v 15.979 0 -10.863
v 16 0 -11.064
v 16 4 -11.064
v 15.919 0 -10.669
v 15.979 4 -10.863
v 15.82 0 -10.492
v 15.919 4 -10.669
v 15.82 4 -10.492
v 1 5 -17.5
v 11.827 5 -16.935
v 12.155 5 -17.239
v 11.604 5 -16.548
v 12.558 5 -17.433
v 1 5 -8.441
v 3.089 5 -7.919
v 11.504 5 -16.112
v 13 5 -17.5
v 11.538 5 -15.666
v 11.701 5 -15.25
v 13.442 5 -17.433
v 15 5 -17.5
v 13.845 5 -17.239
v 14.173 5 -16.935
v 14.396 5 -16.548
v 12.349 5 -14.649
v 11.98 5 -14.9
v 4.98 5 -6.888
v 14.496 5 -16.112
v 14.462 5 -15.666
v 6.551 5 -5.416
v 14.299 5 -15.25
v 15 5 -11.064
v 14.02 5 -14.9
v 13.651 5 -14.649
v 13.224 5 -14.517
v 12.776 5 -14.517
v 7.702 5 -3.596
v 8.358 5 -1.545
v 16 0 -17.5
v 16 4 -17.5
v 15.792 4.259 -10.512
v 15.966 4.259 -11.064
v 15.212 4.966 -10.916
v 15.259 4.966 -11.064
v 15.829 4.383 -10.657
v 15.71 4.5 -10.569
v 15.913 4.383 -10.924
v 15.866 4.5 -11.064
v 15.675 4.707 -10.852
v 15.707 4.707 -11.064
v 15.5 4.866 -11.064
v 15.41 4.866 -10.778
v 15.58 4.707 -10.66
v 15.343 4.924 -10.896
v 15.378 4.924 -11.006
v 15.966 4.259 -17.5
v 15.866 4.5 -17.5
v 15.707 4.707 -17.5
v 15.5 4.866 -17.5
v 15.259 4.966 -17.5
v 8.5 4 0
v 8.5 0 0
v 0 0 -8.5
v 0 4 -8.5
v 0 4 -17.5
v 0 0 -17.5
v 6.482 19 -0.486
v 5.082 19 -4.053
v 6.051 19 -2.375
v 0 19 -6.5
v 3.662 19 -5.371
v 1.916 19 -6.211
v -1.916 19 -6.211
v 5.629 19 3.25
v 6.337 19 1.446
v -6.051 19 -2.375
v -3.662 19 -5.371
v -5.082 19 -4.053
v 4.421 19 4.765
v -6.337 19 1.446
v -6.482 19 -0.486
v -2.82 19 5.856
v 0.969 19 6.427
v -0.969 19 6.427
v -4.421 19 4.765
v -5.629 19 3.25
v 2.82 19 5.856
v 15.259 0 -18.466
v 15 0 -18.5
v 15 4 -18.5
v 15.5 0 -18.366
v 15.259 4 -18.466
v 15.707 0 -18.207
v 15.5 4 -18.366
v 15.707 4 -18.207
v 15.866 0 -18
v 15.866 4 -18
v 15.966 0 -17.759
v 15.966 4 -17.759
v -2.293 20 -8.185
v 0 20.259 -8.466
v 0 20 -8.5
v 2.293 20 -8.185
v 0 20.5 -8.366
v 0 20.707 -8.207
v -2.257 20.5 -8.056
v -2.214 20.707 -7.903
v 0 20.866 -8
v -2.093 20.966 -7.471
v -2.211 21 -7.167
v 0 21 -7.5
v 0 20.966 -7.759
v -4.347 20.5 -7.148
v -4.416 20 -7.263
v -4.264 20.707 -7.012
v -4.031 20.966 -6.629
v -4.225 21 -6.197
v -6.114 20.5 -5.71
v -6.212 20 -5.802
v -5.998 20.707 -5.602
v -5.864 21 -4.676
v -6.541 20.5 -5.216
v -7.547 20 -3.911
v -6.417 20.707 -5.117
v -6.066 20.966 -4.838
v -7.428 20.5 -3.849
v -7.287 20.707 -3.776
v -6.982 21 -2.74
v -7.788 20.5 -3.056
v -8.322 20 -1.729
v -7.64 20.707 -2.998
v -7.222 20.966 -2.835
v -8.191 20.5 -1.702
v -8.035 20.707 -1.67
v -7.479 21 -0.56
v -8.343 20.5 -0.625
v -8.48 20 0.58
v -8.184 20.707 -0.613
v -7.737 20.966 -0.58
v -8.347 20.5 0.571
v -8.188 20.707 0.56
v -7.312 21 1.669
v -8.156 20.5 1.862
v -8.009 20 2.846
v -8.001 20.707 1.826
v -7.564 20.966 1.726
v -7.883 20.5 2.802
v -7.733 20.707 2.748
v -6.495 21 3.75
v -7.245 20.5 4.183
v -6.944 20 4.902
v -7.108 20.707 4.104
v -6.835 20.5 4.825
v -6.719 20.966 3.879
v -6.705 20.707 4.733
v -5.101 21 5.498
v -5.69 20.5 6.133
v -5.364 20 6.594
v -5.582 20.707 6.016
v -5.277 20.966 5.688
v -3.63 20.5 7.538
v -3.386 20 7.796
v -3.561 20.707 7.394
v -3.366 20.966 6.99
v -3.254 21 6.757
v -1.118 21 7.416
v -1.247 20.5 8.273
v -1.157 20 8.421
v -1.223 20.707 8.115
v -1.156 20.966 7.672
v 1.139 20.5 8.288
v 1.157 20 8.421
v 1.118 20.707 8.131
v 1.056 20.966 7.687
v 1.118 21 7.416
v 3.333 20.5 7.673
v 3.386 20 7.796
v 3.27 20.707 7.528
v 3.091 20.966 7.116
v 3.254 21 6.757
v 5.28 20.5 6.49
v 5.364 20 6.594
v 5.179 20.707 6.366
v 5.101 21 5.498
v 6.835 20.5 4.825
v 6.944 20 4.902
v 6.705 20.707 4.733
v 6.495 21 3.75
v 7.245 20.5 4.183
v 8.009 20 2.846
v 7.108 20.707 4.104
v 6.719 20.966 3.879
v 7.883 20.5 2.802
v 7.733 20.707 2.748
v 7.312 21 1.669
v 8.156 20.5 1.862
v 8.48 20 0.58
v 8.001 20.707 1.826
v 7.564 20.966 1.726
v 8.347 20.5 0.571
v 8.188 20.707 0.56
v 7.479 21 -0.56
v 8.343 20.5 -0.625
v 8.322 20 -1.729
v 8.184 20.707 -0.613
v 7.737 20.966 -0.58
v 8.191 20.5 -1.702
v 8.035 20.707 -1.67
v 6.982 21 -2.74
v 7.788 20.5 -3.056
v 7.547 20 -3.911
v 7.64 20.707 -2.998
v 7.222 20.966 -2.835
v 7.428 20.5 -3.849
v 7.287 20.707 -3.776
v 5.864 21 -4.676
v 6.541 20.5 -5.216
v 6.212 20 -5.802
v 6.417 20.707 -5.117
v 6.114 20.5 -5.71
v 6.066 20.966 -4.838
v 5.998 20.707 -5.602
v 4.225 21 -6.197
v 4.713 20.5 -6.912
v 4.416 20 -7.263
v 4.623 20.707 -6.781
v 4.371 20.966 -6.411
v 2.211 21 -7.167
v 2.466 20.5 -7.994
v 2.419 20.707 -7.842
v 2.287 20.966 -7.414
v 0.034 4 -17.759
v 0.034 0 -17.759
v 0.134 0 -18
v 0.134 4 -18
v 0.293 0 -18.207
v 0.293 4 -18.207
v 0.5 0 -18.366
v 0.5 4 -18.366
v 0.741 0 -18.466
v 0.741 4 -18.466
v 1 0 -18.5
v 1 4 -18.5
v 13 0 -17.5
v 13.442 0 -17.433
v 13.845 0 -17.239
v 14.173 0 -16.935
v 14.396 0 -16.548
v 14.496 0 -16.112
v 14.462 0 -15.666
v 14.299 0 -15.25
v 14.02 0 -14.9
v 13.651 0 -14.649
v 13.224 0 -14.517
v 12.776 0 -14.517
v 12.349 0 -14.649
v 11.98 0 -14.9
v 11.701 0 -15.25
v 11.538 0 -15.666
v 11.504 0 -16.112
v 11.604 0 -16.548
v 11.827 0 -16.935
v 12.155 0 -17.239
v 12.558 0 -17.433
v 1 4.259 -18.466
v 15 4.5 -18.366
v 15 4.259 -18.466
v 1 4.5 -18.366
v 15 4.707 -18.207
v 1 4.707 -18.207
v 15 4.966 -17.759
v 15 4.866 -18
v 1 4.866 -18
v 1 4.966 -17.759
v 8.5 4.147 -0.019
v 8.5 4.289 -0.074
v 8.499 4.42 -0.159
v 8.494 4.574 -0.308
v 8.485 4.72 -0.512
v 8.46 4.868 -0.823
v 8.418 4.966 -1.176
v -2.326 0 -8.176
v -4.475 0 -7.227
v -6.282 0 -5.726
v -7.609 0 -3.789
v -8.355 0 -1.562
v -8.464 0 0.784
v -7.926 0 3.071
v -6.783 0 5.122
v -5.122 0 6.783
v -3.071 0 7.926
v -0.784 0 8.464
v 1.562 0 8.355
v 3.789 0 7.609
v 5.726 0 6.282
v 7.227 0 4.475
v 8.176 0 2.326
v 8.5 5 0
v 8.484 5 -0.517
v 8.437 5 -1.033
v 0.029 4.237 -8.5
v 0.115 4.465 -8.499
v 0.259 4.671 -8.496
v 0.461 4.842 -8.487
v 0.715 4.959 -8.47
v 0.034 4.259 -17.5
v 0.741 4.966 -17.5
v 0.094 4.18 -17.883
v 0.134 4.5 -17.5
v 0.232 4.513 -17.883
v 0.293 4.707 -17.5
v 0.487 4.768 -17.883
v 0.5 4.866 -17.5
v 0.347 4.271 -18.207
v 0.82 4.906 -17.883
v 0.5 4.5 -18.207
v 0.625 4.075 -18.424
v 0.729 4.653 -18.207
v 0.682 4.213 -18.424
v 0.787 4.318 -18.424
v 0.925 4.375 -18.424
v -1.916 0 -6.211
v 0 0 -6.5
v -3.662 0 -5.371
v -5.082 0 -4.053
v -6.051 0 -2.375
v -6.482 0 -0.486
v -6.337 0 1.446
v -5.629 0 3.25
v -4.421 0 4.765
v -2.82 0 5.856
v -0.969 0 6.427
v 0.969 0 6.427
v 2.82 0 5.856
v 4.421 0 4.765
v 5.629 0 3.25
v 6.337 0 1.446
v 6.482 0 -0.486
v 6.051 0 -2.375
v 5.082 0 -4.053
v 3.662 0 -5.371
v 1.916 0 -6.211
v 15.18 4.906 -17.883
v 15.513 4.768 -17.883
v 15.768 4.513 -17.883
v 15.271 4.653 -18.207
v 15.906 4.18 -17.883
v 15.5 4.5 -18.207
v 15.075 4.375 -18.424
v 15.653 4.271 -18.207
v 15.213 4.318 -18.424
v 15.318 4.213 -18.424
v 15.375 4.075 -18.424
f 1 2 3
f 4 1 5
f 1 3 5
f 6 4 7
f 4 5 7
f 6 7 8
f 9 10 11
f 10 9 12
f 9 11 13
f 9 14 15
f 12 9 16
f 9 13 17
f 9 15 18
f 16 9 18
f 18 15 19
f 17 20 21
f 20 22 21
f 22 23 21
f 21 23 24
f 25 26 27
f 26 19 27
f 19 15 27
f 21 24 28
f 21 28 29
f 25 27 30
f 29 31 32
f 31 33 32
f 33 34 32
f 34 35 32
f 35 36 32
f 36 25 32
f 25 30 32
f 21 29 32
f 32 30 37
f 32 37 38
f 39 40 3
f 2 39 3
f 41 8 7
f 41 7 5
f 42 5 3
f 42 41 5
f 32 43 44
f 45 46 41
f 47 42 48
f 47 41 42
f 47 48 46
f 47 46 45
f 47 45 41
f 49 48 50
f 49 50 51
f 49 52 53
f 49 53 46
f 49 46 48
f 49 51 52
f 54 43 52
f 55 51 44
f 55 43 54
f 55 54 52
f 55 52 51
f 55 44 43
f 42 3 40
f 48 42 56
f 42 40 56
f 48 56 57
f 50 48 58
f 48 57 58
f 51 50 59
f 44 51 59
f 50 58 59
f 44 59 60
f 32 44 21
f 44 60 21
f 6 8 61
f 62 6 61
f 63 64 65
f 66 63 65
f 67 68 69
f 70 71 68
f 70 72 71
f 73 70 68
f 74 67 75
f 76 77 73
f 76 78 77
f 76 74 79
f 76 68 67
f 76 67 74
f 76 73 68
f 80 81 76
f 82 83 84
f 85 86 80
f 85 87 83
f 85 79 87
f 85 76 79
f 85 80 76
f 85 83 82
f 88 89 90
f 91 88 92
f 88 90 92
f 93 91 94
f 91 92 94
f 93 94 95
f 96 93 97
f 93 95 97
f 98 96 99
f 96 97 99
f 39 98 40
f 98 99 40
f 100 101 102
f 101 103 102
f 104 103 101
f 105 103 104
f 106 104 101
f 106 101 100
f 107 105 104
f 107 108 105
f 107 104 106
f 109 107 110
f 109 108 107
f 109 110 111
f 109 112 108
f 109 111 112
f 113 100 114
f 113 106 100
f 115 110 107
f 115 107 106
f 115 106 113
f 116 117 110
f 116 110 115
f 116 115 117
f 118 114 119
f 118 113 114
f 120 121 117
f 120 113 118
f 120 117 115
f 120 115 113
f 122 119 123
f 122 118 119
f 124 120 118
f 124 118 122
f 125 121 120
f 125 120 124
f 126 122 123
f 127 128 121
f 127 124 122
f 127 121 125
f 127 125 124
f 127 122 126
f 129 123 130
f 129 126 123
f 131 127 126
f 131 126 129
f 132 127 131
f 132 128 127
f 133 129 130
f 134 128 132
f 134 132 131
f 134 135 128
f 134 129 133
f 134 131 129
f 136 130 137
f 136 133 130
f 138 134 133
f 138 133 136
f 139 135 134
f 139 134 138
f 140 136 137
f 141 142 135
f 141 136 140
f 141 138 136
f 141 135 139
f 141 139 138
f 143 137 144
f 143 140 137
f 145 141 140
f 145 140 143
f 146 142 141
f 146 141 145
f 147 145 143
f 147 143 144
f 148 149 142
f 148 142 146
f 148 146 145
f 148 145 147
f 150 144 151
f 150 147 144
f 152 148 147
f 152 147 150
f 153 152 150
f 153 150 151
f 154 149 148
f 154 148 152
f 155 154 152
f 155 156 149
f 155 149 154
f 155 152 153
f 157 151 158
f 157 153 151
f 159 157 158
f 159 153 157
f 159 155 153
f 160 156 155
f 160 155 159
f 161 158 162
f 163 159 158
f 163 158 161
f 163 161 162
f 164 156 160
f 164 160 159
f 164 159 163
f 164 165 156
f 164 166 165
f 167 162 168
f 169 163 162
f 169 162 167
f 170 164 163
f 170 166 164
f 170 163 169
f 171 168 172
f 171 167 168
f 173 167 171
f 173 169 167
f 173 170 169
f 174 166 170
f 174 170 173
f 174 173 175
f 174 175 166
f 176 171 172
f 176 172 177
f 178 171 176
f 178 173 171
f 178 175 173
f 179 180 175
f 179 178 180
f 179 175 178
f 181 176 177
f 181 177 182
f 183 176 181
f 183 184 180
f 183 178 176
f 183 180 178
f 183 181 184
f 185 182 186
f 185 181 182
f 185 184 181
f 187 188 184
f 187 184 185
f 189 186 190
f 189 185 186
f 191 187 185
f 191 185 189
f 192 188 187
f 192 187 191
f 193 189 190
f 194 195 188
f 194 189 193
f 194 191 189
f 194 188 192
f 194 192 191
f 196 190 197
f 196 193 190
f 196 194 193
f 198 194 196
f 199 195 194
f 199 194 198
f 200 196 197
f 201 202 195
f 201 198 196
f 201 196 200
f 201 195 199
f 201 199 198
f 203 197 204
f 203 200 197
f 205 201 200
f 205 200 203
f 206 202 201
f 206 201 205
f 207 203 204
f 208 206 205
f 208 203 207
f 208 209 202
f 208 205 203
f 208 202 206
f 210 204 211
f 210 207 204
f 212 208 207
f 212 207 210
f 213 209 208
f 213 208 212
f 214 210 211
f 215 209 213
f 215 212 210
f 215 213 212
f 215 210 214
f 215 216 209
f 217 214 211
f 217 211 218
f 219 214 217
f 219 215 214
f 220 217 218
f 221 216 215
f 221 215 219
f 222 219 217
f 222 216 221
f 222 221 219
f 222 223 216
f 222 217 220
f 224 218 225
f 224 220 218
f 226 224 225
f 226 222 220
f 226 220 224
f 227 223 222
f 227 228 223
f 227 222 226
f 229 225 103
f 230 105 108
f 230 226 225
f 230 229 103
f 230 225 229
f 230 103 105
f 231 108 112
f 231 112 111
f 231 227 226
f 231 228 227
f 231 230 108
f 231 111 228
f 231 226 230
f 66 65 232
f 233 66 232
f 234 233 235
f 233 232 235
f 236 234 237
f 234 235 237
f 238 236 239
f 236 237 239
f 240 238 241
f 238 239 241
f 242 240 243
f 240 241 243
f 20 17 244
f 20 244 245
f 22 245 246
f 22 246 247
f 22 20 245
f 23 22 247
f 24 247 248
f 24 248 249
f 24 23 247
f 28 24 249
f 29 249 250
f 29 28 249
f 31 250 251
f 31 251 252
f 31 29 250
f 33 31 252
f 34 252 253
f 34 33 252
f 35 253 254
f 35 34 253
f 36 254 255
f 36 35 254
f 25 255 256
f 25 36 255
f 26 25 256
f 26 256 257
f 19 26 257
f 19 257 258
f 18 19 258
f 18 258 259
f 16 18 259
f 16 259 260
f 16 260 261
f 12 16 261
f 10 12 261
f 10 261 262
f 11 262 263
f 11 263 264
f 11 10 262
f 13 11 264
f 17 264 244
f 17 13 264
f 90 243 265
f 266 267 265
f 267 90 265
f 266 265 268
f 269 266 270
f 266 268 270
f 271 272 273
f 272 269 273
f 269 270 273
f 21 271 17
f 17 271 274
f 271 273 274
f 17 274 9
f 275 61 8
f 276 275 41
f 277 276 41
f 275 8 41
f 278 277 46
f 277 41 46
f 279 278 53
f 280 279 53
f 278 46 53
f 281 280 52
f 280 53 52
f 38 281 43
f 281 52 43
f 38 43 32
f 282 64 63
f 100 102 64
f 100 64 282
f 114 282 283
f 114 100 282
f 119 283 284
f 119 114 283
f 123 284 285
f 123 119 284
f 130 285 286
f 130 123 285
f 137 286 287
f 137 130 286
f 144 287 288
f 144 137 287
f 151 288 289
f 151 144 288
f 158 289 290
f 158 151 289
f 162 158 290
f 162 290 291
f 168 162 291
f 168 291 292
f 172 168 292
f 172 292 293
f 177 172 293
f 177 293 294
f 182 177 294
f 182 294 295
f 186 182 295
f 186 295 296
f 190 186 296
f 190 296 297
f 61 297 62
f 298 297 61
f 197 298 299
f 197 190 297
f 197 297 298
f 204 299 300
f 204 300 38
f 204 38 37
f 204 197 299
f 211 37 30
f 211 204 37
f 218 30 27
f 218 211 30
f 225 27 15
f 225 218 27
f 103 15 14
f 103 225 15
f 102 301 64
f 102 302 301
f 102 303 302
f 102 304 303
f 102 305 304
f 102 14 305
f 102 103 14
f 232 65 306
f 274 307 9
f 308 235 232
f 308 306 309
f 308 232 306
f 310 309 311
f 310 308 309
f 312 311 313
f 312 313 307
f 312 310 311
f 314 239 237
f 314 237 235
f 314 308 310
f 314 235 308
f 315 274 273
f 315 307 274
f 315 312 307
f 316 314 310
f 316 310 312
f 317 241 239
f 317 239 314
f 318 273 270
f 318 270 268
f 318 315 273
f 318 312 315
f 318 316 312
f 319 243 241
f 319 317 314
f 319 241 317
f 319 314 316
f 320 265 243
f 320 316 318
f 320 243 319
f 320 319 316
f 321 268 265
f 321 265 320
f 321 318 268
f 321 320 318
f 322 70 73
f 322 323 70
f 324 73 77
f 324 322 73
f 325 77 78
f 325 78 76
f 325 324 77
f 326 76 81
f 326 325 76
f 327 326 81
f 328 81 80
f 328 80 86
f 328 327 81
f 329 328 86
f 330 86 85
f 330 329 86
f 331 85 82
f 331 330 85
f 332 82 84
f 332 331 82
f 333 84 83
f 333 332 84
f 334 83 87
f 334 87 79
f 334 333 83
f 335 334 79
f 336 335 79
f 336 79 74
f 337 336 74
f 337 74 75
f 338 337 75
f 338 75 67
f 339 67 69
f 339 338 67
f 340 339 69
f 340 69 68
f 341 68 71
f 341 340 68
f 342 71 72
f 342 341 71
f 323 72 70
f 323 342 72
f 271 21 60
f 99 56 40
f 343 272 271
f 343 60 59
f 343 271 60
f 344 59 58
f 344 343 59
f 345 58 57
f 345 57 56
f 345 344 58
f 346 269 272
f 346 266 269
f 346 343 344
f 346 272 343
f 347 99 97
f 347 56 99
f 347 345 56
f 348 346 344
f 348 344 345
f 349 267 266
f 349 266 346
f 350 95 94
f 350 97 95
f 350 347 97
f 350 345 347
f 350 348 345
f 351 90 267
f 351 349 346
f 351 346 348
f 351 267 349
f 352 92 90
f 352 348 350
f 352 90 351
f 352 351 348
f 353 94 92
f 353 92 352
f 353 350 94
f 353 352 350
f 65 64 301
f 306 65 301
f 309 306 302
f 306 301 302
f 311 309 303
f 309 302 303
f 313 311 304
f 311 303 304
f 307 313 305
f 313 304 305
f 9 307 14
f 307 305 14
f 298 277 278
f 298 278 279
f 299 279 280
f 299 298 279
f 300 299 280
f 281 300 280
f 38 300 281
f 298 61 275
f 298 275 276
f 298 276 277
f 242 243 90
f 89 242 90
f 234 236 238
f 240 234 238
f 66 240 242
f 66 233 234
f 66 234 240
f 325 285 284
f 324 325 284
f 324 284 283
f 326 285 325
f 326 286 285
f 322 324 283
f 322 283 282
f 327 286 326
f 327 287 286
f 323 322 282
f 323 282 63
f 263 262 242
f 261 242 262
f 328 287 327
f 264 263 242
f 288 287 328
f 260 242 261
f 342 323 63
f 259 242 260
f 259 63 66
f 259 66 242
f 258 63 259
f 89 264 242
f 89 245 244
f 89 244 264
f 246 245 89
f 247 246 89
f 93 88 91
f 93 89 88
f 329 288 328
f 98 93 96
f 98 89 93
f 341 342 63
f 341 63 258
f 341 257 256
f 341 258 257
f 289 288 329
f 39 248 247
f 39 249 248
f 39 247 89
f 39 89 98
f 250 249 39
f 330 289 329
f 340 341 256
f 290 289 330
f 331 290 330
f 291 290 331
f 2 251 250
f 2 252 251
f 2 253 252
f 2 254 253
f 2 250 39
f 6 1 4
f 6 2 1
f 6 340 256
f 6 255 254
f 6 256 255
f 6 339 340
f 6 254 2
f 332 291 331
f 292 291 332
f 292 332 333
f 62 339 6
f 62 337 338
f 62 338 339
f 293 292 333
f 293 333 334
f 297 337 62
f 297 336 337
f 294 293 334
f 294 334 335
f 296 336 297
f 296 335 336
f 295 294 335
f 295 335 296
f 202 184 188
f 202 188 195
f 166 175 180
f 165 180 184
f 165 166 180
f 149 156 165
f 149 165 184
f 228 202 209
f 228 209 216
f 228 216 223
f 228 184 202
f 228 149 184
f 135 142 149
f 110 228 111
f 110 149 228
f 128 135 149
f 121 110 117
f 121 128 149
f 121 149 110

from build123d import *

# Parameters (mm, degrees)
SALIENTE_EXTRUIR1_START = -5
CROQUIS2_R              = 1.5
SALIENTE_EXTRUIR1_DEPTH = 5
REDONDEO1_R             = 1


with BuildPart() as part:
    # Croquis1 → Revolución1 (revolve)
    with BuildSketch(Plane.XY, mode=Mode.PRIVATE) as revoluci_n1_sk:
        Polygon((0, 19), (-6.5, 19), (-6.5, 0), (-8.5, 0), (-8.5, 21), (0, 21), align=None)
    revolve(revoluci_n1_sk.sketch.rotate(Axis((0, 0, 0), (0, 1, 0)), 270), axis=Axis((0, 0, 0), (0, 1, 0)))

    # Croquis2 → Saliente-Extruir1 (add)
    with BuildSketch(Plane.XZ.offset(SALIENTE_EXTRUIR1_START)):
        with BuildLine():
            Line((10, -18.5), (16, -18.5))
            Line((16, -18.5), (16, -10.75))
            Line((16, -10.75), (8.5, 0))
            ThreePointArc((8.5, 0), (6.01040764, -6.01040764), (0, -8.5))
            Line((0, -8.5), (0, -18.5))
            Line((0, -18.5), (10, -18.5))
        make_face()
        with Locations(Location((13, -16, 0), (0, 0, 270))):
            Circle(CROQUIS2_R, mode=Mode.SUBTRACT)
    extrude(amount=SALIENTE_EXTRUIR1_DEPTH)

    # Redondeo1
    # the kernel refuses this fillet: 1 mm, written as the material it takes off along each edge
    with BuildSketch(Plane(origin=(15, 4, -11.064363564), x_dir=(0.8201269543011832, 0, 0.5721815960240815), z_dir=(0, 1, 0))) as redondeo1_piece_1_section:
        Polygon((0, 0), (REDONDEO1_R, 0), (REDONDEO1_R, REDONDEO1_R * 0.314363563856), (REDONDEO1_R * 0.820126954301, REDONDEO1_R * 0.572181596024), align=None)
    redondeo1_piece_1 = extrude(amount=REDONDEO1_R, mode=Mode.PRIVATE)
    redondeo1_piece_1 = redondeo1_piece_1 - Plane(origin=(15, 4, -11.064363564), x_dir=(-0.9539724719039809, 0, -0.29989418608804086), z_dir=(0, 1, 0)) * Sphere(REDONDEO1_R, mode=Mode.PRIVATE)
    add(redondeo1_piece_1, mode=Mode.SUBTRACT)
    with BuildSketch(Plane(origin=(15, 4, -17.5), x_dir=(1, 0, 0), z_dir=(0, 0, -1))) as redondeo1_piece_2_section:
        Polygon((0, 0), (REDONDEO1_R, 0), (REDONDEO1_R, -REDONDEO1_R), (0, -REDONDEO1_R), align=None)
    redondeo1_piece_2 = extrude(amount=REDONDEO1_R, mode=Mode.PRIVATE)
    redondeo1_piece_2 = redondeo1_piece_2 - Plane(origin=(15, 4, -17.5), x_dir=(-0.7071067811865475, -0.7071067811865475, 0), z_dir=(0, 0, -1)) * Sphere(REDONDEO1_R, mode=Mode.PRIVATE)
    add(redondeo1_piece_2, mode=Mode.SUBTRACT)
    with BuildSketch(Plane(origin=(1, 4, -17.5), x_dir=(-1, 0, 0), z_dir=(0, 0, -1))) as redondeo1_piece_3_section:
        Polygon((0, 0), (REDONDEO1_R, 0), (REDONDEO1_R, REDONDEO1_R), (0, REDONDEO1_R), align=None)
    redondeo1_piece_3 = extrude(amount=REDONDEO1_R, mode=Mode.PRIVATE)
    redondeo1_piece_3 = redondeo1_piece_3 - Plane(origin=(1, 4, -17.5), x_dir=(0.7071067811865475, -0.7071067811865475, 0), z_dir=(0, 0, -1)) * Sphere(REDONDEO1_R, mode=Mode.PRIVATE)
    add(redondeo1_piece_3, mode=Mode.SUBTRACT)
    with BuildSketch(Plane(origin=(15.820126954, 5, -10.492181968), x_dir=(-0.8201269543011831, 0, -0.5721815960240815), z_dir=(-0.5721815960240815, 0, 0.8201269543011832))) as redondeo1_piece_4_section:
        with BuildLine():
            CenterArc((REDONDEO1_R, REDONDEO1_R), REDONDEO1_R, 180, 90)
            Line((0, REDONDEO1_R), (0, 0))
            Line((0, 0), (REDONDEO1_R, 0))
        make_face()
    redondeo1_piece_4 = extrude(amount=15.293363165, mode=Mode.PRIVATE)
    redondeo1_piece_4 = redondeo1_piece_4 - Plane(origin=(0, 4.770801137, 0), x_dir=(0, 0, -1), z_dir=(0, 1, 0)) * Cylinder(8.5, 35, mode=Mode.PRIVATE)
    add(redondeo1_piece_4, mode=Mode.SUBTRACT)
    with BuildSketch(Plane(origin=(16, 5, -17.5), x_dir=(-1, 0, 0), z_dir=(0, 0, 1))) as redondeo1_piece_5:
        with BuildLine():
            CenterArc((REDONDEO1_R, REDONDEO1_R), REDONDEO1_R, 180, 90)
            Line((0, REDONDEO1_R), (0, 0))
            Line((0, 0), (REDONDEO1_R, 0))
        make_face()
    extrude(amount=6.435636436, mode=Mode.SUBTRACT)
    with BuildSketch(Plane(origin=(16, 4, -10.75), x_dir=(-0.5721815960240826, 0, 0.8201269543011824), z_dir=(0, -1, 0))) as redondeo1_piece_6:
        with BuildLine():
            CenterArc((REDONDEO1_R * 0.314363563856, REDONDEO1_R), REDONDEO1_R, 235.097504384, 34.902495616)
            Line((-REDONDEO1_R * 0.257818032168, REDONDEO1_R * 0.179873045699), (0, 0))
            Line((0, 0), (REDONDEO1_R * 0.314363563856, 0))
        make_face()
    extrude(amount=4.78590891, mode=Mode.SUBTRACT)
    with BuildSketch(Plane(origin=(1, 5, -18.5), x_dir=(0, 0, 1), z_dir=(1, 0, 0))) as redondeo1_piece_7:
        with BuildLine():
            CenterArc((REDONDEO1_R, REDONDEO1_R), REDONDEO1_R, 180, 90)
            Line((0, REDONDEO1_R), (0, 0))
            Line((0, 0), (REDONDEO1_R, 0))
        make_face()
    extrude(amount=14, mode=Mode.SUBTRACT)
    with BuildSketch(Plane(origin=(16, 4, -18.5), x_dir=(-1, 0, 0), z_dir=(0, -1, 0)), Plane(origin=(0, 4, -18.5), x_dir=(0, 0, 1), z_dir=(0, -1, 0))) as redondeo1_piece_8:
        with BuildLine():
            CenterArc((REDONDEO1_R, -REDONDEO1_R), REDONDEO1_R, 90, 90)
            Line((0, -REDONDEO1_R), (0, 0))
            Line((0, 0), (REDONDEO1_R, 0))
        make_face()
    extrude(amount=6.5, mode=Mode.SUBTRACT)
    with BuildSketch(Plane(origin=(0, 5, -6), x_dir=(0, -1, 0), z_dir=(0, 0, -1))) as redondeo1_piece_9_section:
        with BuildLine():
            CenterArc((REDONDEO1_R, -REDONDEO1_R), REDONDEO1_R, 90, 90)
            Line((0, -REDONDEO1_R), (0, 0))
            Line((0, 0), (REDONDEO1_R, 0))
        make_face()
    redondeo1_piece_9 = extrude(amount=11.5, mode=Mode.PRIVATE)
    redondeo1_piece_9 = redondeo1_piece_9 - Plane(origin=(0, 4.773710582, 0), x_dir=(0, 0, -1), z_dir=(0, 1, 0)) * Cylinder(8.5, 27, mode=Mode.PRIVATE)
    add(redondeo1_piece_9, mode=Mode.SUBTRACT)
    with BuildSketch(Plane(origin=(0, 21, 0), x_dir=(0, 0, -1), z_dir=(1, 0, 0))) as redondeo1_piece_10:
        with BuildLine():
            CenterArc((8.5 - REDONDEO1_R, -REDONDEO1_R), REDONDEO1_R, 0, 90)
            Line((8.5 - REDONDEO1_R, 0), (8.5, 0))
            Line((8.5, 0), (8.5, -REDONDEO1_R))
        make_face()
    revolve(axis=Axis((0, 21, 0), (0, 1, 0)), mode=Mode.SUBTRACT)


solid = part.part
